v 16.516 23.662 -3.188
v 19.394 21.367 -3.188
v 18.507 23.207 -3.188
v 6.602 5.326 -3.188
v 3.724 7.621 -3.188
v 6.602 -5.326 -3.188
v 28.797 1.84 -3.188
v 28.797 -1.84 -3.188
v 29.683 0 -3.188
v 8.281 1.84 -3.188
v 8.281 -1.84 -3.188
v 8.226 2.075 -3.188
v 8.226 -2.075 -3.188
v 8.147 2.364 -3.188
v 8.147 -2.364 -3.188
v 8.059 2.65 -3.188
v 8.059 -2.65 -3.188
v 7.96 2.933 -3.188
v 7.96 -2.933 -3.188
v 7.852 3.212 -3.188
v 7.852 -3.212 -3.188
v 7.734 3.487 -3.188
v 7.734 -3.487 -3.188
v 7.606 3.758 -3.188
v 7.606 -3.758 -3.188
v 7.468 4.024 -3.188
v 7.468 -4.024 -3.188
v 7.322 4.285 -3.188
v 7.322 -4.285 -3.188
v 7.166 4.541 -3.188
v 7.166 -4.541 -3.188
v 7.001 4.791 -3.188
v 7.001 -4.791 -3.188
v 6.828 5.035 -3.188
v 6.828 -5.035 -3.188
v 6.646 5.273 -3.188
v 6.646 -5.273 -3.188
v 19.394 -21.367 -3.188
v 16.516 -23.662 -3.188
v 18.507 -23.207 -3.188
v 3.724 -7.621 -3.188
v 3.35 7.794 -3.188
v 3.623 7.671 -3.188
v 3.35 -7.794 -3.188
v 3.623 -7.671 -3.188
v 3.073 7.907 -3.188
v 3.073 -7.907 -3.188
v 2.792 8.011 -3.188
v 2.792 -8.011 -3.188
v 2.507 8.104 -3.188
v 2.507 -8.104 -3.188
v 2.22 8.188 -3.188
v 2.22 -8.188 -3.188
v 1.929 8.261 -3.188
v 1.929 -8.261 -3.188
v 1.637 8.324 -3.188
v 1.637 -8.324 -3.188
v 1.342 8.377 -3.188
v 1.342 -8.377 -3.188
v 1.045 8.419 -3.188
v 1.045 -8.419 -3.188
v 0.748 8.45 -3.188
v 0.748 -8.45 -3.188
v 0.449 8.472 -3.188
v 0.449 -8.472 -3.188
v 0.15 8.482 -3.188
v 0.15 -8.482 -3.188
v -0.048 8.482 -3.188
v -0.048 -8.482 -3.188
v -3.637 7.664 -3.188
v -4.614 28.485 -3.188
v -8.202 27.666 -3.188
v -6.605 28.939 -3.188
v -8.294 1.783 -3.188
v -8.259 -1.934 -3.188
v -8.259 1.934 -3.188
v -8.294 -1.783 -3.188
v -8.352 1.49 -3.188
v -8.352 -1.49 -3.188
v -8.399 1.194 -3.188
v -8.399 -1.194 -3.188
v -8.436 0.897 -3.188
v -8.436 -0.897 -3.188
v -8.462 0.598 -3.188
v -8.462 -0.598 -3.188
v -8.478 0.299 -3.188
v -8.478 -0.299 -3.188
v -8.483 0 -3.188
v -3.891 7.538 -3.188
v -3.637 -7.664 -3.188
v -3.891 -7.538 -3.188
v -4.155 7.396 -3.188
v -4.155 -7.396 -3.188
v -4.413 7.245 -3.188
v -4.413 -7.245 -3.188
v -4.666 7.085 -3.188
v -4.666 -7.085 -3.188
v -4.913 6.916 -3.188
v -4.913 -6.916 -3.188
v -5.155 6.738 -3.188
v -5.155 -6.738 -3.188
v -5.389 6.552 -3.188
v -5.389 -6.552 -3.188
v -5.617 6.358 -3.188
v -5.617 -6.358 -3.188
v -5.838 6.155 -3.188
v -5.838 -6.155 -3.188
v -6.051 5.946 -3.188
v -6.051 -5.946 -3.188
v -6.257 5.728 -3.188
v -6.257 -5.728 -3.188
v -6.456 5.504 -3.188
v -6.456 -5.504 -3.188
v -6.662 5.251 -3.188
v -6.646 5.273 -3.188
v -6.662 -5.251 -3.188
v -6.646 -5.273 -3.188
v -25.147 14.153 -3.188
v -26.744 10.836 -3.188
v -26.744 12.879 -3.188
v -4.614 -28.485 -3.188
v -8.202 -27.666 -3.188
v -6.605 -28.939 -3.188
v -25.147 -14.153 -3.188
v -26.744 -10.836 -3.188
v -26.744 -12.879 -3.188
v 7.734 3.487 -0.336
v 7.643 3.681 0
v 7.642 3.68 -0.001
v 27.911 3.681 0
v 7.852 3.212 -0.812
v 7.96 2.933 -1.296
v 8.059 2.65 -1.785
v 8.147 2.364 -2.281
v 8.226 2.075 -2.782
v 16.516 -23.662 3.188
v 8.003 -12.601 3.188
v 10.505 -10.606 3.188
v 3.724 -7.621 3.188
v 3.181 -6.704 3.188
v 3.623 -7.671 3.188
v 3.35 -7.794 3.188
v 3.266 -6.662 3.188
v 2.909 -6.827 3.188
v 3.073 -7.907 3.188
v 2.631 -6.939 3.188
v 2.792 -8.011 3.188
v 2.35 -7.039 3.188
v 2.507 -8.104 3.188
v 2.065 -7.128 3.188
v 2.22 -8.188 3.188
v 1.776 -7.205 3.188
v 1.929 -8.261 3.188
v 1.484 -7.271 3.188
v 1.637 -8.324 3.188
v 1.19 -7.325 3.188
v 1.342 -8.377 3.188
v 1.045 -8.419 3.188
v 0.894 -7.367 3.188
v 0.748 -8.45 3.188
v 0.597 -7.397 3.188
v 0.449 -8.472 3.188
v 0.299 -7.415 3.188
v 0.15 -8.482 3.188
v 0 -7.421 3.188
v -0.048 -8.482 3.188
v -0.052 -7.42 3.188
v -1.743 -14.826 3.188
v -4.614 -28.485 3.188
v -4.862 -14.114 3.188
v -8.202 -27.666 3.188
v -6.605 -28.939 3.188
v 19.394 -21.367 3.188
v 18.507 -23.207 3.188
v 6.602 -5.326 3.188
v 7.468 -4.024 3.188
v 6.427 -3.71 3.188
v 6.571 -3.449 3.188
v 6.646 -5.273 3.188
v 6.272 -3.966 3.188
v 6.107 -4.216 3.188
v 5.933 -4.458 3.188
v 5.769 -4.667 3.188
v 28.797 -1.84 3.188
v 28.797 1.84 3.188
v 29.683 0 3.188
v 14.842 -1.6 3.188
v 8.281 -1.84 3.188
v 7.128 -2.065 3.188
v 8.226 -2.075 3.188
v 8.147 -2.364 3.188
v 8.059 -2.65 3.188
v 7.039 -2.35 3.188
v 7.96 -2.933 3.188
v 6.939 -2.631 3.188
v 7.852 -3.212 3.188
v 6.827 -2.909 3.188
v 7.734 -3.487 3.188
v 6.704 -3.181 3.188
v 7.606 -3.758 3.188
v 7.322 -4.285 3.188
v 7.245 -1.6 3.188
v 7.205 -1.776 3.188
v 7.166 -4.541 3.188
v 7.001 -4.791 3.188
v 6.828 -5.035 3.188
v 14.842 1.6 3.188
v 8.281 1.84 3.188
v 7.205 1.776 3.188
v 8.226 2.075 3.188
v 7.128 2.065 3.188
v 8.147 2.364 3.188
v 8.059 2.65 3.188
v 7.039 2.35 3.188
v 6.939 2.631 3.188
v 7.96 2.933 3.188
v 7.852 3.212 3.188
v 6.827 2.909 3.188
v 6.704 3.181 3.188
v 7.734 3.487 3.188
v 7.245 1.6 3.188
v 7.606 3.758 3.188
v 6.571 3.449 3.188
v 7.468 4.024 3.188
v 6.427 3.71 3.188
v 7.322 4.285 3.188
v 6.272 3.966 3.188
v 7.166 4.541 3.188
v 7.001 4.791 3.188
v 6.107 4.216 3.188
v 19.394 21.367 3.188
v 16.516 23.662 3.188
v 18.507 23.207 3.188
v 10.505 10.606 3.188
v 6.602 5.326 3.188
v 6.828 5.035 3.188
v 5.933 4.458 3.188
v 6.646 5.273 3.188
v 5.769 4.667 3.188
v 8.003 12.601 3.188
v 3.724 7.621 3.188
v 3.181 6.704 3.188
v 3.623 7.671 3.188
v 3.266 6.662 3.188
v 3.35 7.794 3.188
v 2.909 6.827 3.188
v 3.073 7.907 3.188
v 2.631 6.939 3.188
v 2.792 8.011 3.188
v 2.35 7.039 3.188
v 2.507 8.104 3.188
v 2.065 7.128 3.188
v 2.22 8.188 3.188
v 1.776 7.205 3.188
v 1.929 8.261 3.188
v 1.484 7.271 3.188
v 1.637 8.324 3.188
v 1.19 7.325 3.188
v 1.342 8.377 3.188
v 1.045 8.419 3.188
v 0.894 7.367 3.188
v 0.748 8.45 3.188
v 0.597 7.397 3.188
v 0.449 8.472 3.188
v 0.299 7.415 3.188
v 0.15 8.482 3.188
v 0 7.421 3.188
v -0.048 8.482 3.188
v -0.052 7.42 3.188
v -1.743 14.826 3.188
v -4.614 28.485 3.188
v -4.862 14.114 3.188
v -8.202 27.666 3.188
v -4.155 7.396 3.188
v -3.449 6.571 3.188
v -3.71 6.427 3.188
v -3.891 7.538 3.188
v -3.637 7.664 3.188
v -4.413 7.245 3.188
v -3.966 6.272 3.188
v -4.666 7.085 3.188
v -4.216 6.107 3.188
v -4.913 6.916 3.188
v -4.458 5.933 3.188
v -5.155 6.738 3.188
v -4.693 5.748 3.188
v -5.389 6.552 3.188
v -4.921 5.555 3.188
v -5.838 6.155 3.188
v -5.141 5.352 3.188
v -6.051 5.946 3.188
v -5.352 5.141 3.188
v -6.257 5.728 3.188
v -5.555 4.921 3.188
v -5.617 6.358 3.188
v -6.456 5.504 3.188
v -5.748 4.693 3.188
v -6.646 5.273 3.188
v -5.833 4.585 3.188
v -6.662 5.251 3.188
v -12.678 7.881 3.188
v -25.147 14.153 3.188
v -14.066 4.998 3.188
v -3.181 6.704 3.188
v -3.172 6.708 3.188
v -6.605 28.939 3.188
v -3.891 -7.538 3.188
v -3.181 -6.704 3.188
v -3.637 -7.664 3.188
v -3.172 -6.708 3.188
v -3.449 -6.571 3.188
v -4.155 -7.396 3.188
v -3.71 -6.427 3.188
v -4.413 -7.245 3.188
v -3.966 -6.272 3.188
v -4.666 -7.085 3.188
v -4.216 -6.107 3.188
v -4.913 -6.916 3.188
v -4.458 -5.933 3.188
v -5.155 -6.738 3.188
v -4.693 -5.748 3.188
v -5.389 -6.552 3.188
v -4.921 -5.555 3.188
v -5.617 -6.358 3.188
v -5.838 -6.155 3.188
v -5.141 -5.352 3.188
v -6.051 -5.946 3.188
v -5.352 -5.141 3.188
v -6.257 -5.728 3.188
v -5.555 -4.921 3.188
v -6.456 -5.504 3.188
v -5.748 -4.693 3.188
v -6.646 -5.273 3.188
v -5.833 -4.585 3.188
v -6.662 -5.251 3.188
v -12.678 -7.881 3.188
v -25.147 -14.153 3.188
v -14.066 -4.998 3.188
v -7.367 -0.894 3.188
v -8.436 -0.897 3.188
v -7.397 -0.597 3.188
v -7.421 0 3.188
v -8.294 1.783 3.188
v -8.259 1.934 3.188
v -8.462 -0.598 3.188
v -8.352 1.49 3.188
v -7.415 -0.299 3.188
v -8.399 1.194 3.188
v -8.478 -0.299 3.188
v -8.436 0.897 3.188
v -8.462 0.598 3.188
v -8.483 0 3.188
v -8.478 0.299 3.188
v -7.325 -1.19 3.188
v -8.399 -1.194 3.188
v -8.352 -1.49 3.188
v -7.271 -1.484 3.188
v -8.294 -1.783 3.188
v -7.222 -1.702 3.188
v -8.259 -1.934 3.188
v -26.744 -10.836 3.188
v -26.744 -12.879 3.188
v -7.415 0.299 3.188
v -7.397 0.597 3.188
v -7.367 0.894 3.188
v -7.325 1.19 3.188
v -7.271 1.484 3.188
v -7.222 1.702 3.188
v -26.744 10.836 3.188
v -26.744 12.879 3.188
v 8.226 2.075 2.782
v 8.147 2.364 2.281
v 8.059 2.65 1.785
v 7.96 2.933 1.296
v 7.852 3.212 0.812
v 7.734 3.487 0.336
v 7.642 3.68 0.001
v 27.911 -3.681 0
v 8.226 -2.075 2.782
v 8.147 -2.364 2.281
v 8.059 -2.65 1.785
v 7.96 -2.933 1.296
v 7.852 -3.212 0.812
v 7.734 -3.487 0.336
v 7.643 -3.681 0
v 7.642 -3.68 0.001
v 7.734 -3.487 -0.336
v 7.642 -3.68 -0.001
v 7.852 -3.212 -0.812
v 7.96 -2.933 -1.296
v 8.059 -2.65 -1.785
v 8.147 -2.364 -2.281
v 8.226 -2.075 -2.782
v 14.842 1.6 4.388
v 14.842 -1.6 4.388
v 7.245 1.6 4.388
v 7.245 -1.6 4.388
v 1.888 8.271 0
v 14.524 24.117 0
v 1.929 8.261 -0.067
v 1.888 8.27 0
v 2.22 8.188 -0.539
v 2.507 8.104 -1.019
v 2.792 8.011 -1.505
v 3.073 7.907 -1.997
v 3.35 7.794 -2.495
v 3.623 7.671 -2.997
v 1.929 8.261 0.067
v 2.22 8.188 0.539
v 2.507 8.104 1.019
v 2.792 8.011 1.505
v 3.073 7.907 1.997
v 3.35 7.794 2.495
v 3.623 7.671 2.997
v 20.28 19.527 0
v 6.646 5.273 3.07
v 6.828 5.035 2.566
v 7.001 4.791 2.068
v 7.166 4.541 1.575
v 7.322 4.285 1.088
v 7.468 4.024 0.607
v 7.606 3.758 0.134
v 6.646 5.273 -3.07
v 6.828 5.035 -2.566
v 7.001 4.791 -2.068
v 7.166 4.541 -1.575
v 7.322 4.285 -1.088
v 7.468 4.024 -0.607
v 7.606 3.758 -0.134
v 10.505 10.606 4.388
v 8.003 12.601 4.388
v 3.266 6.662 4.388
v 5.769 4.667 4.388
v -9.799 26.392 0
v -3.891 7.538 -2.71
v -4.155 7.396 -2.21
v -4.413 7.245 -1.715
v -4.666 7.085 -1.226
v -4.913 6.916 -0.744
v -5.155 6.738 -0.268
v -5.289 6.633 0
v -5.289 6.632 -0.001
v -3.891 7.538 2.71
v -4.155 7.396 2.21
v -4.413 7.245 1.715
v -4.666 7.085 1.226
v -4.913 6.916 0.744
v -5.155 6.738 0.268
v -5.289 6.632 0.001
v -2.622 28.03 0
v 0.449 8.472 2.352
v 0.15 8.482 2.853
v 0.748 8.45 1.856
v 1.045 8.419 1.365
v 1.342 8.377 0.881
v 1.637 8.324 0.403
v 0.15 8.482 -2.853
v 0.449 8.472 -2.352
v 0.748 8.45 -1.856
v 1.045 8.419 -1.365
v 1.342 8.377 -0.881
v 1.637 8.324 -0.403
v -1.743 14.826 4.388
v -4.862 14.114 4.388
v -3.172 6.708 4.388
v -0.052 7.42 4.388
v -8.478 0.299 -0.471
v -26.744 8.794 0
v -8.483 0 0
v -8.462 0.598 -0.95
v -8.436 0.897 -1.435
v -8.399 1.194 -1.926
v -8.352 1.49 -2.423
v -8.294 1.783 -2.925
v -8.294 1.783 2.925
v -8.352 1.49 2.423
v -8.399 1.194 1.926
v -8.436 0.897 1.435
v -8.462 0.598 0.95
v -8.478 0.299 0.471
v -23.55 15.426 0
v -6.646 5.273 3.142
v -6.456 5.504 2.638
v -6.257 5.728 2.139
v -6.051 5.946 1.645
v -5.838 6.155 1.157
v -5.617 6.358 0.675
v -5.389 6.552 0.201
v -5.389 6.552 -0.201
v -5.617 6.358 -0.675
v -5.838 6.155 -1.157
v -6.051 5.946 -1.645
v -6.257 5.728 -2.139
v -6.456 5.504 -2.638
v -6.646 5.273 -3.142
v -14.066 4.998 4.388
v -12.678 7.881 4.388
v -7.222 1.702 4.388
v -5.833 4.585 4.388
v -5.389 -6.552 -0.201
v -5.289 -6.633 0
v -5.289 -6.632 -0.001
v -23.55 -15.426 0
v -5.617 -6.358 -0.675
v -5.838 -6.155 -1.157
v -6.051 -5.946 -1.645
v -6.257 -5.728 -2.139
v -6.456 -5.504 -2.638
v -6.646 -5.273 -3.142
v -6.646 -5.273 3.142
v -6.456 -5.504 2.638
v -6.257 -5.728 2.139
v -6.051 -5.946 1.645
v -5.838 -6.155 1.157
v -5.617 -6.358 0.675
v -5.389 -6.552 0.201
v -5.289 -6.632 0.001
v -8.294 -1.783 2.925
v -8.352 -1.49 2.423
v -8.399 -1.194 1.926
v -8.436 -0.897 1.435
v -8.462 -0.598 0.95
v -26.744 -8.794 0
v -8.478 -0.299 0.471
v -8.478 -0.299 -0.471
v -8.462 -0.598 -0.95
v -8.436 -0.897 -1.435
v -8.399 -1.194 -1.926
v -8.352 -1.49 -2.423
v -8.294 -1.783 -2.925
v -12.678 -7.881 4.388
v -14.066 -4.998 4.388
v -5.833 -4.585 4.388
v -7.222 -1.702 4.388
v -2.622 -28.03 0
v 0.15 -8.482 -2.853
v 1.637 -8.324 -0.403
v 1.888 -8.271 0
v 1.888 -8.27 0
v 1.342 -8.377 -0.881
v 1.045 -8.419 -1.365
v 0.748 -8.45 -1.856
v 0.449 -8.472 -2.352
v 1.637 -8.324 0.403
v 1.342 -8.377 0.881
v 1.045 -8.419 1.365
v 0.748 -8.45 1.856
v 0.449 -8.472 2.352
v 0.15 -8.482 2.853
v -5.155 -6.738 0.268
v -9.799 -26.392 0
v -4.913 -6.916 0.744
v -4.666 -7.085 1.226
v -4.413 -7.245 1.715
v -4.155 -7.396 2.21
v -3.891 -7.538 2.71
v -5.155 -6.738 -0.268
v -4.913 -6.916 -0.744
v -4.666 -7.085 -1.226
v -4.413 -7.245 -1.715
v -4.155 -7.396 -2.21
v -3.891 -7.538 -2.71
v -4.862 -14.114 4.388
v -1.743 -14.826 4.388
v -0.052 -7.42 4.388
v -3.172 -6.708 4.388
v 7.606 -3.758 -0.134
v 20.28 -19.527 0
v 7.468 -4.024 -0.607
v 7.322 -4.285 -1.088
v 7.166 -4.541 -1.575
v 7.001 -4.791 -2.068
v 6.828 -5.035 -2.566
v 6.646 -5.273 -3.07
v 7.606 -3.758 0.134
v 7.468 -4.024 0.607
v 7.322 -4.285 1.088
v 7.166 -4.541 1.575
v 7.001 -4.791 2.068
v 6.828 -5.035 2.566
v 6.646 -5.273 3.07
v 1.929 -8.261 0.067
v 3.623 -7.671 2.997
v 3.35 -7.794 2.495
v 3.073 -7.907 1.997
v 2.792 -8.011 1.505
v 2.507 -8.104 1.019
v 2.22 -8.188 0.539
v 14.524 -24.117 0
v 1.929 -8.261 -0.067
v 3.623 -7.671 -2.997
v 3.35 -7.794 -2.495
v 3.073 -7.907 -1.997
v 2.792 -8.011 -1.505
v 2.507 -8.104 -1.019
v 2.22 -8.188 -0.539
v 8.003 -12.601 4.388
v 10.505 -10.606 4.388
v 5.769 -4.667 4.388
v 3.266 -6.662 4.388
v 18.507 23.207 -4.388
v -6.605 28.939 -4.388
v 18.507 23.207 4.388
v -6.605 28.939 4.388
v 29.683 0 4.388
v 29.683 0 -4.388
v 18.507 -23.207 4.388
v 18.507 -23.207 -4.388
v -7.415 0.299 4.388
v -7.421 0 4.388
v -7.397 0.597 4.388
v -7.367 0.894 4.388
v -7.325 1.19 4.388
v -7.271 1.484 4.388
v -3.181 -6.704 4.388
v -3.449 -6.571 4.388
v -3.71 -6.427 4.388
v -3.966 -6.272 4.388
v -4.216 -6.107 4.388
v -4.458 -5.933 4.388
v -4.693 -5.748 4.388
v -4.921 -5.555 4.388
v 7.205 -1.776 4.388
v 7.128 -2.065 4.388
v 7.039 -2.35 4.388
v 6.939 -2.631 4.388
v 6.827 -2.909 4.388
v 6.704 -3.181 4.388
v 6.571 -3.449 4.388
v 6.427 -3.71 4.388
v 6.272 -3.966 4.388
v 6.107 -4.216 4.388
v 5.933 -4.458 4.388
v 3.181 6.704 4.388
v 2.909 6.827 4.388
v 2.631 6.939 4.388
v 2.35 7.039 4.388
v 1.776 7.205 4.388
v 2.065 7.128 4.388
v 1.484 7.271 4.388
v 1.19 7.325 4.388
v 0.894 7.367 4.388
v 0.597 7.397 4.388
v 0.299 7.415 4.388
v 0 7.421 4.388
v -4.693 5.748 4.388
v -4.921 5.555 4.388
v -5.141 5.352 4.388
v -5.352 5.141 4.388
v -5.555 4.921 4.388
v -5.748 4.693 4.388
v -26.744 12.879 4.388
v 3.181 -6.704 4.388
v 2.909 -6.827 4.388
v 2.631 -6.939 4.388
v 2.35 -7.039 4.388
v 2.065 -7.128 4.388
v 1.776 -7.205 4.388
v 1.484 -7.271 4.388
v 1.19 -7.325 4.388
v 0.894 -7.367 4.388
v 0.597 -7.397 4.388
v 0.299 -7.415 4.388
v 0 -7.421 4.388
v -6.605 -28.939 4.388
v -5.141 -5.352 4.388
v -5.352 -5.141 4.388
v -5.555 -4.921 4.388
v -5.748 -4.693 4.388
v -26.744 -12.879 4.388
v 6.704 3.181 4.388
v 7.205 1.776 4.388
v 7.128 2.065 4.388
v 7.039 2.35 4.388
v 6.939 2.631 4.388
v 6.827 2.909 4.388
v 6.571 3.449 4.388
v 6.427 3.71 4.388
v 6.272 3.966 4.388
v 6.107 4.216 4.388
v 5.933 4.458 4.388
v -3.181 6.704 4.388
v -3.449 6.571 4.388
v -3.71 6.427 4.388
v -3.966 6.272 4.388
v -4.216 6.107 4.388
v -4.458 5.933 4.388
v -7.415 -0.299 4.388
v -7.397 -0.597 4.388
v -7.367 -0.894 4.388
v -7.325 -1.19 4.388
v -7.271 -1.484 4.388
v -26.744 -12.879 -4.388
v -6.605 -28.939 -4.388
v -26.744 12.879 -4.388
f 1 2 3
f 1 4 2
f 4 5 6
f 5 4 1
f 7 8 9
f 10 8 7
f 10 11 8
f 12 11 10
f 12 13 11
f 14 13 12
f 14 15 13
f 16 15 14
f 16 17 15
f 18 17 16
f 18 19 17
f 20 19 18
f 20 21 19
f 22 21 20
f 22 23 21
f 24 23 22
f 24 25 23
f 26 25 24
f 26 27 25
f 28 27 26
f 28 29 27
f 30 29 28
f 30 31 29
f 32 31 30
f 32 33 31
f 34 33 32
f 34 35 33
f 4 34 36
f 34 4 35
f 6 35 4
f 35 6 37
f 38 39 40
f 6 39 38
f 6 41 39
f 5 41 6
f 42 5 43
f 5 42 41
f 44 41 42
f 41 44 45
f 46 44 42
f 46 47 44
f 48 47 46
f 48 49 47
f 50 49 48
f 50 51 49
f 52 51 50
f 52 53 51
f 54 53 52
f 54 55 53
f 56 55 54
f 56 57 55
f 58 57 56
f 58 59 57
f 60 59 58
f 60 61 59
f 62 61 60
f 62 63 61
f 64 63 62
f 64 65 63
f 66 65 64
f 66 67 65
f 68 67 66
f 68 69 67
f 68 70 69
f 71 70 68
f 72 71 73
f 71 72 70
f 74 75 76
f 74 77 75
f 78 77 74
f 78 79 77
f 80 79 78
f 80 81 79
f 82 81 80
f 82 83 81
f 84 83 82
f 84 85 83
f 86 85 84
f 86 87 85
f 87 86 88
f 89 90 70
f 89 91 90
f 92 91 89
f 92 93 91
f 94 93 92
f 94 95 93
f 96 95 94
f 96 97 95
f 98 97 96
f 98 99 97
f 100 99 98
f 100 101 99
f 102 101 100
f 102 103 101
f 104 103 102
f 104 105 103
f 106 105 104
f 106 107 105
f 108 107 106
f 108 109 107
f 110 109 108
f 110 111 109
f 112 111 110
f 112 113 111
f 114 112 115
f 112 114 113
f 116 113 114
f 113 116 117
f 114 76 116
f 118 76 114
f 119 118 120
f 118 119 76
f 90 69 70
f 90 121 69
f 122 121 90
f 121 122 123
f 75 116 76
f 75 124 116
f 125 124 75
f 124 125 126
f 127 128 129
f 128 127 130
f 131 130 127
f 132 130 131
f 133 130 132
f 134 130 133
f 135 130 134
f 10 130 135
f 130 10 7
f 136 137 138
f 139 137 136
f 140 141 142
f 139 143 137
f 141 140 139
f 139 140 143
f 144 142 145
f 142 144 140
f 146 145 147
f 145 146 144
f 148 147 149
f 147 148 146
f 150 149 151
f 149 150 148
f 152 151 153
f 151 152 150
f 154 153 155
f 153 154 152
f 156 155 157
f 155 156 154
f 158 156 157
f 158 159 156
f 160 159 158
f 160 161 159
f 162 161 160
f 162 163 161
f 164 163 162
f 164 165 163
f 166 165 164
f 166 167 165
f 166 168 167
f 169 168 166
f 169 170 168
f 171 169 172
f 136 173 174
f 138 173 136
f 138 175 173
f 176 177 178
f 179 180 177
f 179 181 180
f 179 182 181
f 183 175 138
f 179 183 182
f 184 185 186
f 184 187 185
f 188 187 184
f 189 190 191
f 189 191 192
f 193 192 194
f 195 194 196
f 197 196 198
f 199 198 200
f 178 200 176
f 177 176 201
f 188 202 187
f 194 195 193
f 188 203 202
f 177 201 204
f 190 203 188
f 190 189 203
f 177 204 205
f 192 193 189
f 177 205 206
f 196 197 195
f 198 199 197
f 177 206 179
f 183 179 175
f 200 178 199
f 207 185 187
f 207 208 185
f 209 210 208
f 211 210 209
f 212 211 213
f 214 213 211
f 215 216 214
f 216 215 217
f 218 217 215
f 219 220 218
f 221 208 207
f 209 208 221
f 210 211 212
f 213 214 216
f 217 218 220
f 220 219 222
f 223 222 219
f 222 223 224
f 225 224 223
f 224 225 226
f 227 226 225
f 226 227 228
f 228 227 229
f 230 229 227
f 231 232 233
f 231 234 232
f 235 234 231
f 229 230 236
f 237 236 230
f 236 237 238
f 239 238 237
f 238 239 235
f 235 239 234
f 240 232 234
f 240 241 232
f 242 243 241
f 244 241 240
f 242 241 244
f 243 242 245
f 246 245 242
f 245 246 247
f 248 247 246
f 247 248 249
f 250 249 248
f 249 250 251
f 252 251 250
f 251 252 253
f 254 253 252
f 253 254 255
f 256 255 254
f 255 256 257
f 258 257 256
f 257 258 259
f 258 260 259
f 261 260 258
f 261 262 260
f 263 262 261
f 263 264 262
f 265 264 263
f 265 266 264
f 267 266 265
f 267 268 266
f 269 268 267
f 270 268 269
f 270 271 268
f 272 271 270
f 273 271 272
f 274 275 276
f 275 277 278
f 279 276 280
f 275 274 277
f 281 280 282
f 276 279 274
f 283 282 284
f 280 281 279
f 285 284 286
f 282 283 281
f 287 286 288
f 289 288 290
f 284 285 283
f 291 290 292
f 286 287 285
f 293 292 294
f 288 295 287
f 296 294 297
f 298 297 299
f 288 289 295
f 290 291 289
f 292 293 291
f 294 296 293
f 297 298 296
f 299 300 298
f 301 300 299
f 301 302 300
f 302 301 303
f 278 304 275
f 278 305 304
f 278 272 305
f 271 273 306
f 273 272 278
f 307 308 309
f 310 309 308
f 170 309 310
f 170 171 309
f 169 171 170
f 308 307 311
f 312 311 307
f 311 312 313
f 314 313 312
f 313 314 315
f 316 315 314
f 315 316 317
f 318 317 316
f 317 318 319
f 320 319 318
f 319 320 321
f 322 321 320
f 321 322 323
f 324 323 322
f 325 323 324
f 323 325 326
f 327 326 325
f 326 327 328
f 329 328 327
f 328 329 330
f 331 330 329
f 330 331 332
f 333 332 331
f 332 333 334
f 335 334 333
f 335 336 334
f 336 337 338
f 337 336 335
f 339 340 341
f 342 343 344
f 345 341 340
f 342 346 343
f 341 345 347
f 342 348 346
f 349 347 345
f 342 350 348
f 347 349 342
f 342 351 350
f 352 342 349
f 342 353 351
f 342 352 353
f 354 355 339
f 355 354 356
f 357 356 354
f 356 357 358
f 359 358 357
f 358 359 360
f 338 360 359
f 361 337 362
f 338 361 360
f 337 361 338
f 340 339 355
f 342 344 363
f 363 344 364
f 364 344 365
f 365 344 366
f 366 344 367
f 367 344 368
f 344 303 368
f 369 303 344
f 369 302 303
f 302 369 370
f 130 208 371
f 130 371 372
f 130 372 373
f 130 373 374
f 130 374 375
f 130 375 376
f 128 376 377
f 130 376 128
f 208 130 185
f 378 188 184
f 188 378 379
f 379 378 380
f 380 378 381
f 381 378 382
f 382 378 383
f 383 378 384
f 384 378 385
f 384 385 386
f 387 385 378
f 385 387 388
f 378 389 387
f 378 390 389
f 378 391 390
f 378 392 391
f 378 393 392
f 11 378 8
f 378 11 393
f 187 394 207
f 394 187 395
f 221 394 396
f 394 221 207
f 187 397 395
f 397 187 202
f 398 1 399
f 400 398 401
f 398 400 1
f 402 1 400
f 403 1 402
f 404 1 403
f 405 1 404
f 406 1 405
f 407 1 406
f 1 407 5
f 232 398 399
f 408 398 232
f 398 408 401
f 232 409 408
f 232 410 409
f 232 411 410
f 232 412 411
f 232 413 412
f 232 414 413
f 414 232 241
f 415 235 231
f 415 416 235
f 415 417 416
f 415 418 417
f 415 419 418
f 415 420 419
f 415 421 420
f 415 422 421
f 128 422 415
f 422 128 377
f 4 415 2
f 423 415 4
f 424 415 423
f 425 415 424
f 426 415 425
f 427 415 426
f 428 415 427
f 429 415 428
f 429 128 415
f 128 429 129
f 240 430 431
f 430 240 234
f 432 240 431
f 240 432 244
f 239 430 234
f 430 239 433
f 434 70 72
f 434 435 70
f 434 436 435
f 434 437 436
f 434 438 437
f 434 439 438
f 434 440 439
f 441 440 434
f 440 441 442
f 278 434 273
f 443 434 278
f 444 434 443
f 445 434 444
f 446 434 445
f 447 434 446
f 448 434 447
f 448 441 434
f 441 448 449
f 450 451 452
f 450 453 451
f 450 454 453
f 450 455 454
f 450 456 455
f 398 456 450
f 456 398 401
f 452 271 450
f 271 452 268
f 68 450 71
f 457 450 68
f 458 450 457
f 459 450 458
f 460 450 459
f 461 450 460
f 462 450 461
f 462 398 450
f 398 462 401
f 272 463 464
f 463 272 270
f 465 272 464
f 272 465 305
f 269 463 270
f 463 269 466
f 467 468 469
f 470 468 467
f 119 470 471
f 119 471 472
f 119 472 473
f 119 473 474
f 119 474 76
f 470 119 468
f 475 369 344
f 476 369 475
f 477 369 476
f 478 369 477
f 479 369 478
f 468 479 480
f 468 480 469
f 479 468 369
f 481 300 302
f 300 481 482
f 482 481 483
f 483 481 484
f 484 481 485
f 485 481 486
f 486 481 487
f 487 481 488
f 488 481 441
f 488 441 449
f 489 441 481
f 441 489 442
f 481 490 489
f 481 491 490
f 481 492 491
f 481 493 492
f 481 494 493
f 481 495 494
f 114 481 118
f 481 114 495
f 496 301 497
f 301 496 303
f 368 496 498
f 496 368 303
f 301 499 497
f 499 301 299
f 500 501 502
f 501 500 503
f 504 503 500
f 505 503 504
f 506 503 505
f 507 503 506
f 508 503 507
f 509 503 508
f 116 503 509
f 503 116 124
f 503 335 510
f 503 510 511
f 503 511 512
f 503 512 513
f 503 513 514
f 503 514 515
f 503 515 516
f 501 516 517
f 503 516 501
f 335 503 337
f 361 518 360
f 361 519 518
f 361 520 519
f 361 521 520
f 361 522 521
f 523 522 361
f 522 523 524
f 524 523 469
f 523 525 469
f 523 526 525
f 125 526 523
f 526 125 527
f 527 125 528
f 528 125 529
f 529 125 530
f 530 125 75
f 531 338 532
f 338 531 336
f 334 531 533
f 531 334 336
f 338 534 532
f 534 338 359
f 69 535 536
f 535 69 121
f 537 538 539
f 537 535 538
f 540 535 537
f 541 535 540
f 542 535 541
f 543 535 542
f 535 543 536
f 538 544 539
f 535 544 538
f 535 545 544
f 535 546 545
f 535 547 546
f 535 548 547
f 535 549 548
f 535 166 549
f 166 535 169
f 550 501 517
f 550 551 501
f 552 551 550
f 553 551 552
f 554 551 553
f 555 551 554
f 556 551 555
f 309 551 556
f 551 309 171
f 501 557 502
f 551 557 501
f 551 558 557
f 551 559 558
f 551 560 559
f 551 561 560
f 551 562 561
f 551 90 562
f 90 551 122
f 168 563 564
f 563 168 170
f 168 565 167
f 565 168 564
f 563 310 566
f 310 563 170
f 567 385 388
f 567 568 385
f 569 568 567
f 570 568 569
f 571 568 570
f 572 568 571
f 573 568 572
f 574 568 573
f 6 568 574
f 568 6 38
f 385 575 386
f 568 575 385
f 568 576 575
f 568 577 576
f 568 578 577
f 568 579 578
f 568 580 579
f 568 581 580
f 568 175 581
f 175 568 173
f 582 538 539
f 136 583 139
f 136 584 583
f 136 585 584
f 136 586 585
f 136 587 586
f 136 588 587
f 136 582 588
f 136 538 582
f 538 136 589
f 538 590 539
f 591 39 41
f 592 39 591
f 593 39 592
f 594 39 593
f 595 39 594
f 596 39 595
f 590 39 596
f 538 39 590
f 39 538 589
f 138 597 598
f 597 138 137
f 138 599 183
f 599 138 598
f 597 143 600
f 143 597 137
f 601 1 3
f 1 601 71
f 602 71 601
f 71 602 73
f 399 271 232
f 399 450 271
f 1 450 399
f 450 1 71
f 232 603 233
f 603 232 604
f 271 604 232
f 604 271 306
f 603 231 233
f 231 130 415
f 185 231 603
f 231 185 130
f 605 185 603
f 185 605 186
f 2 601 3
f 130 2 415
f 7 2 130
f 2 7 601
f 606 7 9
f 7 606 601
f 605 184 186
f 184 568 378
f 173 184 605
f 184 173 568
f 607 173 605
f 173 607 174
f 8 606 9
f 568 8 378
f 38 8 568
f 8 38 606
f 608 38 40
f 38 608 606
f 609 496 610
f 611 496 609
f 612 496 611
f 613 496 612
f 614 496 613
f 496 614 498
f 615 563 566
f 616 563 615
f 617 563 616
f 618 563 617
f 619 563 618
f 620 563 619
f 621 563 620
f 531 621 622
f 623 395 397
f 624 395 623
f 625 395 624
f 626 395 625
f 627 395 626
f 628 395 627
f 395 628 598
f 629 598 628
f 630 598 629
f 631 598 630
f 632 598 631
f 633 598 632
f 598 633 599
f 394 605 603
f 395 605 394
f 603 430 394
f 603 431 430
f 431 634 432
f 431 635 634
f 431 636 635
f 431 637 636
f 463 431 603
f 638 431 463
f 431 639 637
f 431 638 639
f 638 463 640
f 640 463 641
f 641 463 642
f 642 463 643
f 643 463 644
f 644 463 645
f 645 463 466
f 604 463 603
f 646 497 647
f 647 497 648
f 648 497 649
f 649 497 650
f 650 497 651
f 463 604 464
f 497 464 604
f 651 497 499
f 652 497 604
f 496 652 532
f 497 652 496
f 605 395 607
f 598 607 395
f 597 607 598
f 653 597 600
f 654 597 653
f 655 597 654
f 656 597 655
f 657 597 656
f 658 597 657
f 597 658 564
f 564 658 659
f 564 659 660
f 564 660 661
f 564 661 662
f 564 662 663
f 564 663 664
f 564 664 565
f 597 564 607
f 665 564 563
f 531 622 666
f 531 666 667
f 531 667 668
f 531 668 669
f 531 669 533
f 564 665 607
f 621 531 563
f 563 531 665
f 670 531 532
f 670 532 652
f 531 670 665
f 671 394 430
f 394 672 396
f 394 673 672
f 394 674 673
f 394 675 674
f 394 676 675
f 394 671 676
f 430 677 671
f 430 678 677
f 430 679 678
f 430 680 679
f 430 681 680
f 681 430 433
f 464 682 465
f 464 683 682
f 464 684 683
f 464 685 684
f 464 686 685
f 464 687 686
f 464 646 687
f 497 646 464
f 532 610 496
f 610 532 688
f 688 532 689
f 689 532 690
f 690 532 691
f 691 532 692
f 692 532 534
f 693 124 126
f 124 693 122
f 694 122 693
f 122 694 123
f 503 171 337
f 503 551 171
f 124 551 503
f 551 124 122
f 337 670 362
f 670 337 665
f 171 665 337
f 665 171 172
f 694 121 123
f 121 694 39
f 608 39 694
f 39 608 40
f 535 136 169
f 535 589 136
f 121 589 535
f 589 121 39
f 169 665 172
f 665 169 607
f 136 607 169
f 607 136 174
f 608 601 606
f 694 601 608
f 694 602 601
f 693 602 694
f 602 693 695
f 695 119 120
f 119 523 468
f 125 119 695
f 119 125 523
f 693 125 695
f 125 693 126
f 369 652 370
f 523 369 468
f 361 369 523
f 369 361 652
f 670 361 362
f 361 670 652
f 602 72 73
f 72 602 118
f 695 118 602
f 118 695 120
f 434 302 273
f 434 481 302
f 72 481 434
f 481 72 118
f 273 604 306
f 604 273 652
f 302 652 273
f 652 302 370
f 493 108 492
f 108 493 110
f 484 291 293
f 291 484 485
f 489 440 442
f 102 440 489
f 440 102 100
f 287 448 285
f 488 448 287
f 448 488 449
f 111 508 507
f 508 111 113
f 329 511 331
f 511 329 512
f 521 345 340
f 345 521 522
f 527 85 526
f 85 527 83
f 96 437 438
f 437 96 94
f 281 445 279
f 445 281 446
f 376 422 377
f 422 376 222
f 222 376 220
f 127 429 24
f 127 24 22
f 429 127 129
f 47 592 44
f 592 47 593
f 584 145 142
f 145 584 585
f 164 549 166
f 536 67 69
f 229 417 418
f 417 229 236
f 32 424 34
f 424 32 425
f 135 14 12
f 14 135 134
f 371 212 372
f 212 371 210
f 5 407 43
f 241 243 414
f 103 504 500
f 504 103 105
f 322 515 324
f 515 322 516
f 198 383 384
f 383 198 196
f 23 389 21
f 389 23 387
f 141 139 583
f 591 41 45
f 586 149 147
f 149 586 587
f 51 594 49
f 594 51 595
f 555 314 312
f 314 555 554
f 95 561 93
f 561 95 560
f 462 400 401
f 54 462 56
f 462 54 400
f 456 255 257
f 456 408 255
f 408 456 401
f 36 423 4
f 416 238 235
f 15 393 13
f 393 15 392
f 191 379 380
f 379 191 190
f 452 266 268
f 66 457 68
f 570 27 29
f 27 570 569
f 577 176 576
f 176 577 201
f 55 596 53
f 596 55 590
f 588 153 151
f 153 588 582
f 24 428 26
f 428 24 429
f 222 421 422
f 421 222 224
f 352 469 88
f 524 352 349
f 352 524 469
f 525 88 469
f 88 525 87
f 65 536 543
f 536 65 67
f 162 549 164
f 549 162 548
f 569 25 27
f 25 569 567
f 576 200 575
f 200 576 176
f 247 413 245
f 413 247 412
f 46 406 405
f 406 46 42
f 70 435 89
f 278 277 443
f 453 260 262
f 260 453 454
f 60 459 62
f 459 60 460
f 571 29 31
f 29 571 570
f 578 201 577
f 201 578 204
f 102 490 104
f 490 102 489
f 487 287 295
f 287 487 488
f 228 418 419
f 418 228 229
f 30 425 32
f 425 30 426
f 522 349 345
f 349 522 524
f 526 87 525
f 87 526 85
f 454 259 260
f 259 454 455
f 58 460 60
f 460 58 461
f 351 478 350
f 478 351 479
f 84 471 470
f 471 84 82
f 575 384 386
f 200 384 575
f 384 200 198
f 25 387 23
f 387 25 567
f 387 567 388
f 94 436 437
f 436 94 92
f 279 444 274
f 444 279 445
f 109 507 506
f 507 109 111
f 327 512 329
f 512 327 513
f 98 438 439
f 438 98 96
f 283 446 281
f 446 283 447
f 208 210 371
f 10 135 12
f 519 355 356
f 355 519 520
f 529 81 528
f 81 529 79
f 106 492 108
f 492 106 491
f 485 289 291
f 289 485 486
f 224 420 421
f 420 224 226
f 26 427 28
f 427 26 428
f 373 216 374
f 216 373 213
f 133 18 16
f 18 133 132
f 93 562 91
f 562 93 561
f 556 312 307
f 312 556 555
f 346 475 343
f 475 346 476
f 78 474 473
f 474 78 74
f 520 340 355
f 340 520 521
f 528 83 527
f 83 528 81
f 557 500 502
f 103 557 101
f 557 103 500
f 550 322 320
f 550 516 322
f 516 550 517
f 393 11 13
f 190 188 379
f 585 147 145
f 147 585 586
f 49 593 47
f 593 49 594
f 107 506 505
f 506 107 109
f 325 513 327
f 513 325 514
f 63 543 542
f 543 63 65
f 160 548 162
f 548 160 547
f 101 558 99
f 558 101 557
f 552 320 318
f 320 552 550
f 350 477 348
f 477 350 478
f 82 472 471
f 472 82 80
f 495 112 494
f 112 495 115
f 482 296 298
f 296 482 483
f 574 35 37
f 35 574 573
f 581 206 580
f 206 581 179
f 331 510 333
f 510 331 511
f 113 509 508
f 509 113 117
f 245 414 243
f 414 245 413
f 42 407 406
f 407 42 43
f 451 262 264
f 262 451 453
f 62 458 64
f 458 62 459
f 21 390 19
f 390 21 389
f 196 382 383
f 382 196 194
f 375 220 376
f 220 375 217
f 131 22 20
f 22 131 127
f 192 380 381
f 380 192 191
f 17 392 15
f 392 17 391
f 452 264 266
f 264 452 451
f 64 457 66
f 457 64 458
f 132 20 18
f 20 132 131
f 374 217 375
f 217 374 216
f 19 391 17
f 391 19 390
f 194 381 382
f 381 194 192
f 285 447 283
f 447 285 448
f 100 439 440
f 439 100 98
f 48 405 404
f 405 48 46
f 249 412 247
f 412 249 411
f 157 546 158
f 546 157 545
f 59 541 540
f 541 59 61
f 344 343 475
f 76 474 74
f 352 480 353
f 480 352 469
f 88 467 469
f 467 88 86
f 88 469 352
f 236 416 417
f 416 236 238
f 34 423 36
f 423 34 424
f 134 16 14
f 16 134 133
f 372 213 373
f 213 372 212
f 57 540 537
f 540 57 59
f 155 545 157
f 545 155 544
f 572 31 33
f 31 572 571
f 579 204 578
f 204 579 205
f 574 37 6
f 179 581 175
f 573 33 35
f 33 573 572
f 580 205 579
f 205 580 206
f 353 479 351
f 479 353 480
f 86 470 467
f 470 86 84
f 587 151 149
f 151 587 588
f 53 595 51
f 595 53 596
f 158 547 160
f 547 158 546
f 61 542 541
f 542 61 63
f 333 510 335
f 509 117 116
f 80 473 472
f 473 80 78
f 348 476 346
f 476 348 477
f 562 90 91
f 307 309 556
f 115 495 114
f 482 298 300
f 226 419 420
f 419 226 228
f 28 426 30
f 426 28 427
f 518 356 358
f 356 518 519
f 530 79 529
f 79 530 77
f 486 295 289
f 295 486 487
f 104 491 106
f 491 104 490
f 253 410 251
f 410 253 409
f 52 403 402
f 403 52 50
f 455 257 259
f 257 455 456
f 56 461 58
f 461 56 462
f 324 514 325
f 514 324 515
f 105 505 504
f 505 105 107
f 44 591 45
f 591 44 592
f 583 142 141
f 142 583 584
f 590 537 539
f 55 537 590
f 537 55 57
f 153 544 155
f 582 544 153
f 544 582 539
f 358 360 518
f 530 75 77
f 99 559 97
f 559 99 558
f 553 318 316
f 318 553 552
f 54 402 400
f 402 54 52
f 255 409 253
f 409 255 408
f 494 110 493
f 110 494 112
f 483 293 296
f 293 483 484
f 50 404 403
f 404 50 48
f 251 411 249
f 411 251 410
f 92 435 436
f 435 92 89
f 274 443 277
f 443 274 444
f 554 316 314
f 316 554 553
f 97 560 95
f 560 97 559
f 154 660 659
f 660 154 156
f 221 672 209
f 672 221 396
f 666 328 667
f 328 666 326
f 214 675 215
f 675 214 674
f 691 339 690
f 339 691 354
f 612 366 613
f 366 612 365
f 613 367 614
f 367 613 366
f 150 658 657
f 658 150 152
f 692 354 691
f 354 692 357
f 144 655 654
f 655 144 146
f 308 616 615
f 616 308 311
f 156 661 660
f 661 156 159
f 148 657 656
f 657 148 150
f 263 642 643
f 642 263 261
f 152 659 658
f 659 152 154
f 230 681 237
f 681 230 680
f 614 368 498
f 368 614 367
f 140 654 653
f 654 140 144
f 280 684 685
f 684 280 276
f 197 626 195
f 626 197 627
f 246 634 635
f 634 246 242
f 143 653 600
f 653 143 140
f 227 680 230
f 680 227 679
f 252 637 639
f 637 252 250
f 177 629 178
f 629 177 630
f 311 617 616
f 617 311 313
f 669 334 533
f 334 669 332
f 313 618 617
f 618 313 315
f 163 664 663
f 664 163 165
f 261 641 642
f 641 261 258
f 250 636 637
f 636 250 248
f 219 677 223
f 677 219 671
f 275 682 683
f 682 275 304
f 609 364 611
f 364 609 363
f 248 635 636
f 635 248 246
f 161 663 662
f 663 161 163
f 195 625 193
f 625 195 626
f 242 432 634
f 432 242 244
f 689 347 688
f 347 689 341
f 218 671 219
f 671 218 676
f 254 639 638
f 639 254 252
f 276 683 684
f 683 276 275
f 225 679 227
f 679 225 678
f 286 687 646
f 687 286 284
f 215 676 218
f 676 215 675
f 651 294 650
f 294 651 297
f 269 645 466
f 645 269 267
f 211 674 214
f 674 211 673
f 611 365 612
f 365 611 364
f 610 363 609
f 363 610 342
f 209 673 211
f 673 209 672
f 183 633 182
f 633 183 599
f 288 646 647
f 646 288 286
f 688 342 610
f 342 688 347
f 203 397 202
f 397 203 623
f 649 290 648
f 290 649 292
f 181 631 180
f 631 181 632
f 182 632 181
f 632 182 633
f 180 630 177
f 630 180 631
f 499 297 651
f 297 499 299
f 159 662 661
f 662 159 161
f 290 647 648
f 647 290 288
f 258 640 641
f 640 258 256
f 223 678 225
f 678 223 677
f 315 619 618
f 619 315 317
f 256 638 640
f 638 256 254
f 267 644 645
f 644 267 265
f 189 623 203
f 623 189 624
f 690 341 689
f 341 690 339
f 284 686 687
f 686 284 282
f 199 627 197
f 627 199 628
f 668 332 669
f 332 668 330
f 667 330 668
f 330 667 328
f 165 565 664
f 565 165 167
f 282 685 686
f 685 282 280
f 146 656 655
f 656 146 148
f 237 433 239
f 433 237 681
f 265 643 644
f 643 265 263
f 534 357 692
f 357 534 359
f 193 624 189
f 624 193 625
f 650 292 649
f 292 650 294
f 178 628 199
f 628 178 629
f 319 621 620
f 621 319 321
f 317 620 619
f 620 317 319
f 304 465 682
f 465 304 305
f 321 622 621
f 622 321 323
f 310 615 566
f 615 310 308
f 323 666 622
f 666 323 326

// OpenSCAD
$fa = .01;
$fs = .3;


//measured
bitDiameterInches = .251;
nBits = 7;
shankLength = 20;

m3=3+.2;
m3CapD=5.5+.2;
m3CapH=3+.2;
insertDiameter = 4;
insertHeight = 3;
//designed
twt = 1.2;
//constant
inch = 25.4;
//calculated
bitDiameter = bitDiameterInches * inch;
bitCircumDiameter = bitDiameter / cos(30);
id = bitCircumDiameter / sin(180/nBits);
od = id + 2*shankLength+2*twt;
h = bitDiameter + 2 * twt;

difference() {
  //base
  cylinder(d = od, h = h, center = true, $fn=nBits);
  //rotating area
  cylinder(d = id, h = bitDiameter, center = true);

  cylinder(d = od/4, h = h/2+.1);
  for (i = [0:nBits - 1]) rotate([0, 0, 360 * i / nBits]){
    rotate([90, 0, 90]) cylinder(d = bitCircumDiameter, h = od/2*1.1, $fn=6);
    translate([0,-m3/2,0]) cube([od/4,m3,h]);
  }
  %translate([id/2,0,0]) rotate([90, 0, 90]) cylinder(d = bitCircumDiameter-.1, h = shankLength+.1, $fn=6);
  //cutaway
  if($preview)cube(99);
}
